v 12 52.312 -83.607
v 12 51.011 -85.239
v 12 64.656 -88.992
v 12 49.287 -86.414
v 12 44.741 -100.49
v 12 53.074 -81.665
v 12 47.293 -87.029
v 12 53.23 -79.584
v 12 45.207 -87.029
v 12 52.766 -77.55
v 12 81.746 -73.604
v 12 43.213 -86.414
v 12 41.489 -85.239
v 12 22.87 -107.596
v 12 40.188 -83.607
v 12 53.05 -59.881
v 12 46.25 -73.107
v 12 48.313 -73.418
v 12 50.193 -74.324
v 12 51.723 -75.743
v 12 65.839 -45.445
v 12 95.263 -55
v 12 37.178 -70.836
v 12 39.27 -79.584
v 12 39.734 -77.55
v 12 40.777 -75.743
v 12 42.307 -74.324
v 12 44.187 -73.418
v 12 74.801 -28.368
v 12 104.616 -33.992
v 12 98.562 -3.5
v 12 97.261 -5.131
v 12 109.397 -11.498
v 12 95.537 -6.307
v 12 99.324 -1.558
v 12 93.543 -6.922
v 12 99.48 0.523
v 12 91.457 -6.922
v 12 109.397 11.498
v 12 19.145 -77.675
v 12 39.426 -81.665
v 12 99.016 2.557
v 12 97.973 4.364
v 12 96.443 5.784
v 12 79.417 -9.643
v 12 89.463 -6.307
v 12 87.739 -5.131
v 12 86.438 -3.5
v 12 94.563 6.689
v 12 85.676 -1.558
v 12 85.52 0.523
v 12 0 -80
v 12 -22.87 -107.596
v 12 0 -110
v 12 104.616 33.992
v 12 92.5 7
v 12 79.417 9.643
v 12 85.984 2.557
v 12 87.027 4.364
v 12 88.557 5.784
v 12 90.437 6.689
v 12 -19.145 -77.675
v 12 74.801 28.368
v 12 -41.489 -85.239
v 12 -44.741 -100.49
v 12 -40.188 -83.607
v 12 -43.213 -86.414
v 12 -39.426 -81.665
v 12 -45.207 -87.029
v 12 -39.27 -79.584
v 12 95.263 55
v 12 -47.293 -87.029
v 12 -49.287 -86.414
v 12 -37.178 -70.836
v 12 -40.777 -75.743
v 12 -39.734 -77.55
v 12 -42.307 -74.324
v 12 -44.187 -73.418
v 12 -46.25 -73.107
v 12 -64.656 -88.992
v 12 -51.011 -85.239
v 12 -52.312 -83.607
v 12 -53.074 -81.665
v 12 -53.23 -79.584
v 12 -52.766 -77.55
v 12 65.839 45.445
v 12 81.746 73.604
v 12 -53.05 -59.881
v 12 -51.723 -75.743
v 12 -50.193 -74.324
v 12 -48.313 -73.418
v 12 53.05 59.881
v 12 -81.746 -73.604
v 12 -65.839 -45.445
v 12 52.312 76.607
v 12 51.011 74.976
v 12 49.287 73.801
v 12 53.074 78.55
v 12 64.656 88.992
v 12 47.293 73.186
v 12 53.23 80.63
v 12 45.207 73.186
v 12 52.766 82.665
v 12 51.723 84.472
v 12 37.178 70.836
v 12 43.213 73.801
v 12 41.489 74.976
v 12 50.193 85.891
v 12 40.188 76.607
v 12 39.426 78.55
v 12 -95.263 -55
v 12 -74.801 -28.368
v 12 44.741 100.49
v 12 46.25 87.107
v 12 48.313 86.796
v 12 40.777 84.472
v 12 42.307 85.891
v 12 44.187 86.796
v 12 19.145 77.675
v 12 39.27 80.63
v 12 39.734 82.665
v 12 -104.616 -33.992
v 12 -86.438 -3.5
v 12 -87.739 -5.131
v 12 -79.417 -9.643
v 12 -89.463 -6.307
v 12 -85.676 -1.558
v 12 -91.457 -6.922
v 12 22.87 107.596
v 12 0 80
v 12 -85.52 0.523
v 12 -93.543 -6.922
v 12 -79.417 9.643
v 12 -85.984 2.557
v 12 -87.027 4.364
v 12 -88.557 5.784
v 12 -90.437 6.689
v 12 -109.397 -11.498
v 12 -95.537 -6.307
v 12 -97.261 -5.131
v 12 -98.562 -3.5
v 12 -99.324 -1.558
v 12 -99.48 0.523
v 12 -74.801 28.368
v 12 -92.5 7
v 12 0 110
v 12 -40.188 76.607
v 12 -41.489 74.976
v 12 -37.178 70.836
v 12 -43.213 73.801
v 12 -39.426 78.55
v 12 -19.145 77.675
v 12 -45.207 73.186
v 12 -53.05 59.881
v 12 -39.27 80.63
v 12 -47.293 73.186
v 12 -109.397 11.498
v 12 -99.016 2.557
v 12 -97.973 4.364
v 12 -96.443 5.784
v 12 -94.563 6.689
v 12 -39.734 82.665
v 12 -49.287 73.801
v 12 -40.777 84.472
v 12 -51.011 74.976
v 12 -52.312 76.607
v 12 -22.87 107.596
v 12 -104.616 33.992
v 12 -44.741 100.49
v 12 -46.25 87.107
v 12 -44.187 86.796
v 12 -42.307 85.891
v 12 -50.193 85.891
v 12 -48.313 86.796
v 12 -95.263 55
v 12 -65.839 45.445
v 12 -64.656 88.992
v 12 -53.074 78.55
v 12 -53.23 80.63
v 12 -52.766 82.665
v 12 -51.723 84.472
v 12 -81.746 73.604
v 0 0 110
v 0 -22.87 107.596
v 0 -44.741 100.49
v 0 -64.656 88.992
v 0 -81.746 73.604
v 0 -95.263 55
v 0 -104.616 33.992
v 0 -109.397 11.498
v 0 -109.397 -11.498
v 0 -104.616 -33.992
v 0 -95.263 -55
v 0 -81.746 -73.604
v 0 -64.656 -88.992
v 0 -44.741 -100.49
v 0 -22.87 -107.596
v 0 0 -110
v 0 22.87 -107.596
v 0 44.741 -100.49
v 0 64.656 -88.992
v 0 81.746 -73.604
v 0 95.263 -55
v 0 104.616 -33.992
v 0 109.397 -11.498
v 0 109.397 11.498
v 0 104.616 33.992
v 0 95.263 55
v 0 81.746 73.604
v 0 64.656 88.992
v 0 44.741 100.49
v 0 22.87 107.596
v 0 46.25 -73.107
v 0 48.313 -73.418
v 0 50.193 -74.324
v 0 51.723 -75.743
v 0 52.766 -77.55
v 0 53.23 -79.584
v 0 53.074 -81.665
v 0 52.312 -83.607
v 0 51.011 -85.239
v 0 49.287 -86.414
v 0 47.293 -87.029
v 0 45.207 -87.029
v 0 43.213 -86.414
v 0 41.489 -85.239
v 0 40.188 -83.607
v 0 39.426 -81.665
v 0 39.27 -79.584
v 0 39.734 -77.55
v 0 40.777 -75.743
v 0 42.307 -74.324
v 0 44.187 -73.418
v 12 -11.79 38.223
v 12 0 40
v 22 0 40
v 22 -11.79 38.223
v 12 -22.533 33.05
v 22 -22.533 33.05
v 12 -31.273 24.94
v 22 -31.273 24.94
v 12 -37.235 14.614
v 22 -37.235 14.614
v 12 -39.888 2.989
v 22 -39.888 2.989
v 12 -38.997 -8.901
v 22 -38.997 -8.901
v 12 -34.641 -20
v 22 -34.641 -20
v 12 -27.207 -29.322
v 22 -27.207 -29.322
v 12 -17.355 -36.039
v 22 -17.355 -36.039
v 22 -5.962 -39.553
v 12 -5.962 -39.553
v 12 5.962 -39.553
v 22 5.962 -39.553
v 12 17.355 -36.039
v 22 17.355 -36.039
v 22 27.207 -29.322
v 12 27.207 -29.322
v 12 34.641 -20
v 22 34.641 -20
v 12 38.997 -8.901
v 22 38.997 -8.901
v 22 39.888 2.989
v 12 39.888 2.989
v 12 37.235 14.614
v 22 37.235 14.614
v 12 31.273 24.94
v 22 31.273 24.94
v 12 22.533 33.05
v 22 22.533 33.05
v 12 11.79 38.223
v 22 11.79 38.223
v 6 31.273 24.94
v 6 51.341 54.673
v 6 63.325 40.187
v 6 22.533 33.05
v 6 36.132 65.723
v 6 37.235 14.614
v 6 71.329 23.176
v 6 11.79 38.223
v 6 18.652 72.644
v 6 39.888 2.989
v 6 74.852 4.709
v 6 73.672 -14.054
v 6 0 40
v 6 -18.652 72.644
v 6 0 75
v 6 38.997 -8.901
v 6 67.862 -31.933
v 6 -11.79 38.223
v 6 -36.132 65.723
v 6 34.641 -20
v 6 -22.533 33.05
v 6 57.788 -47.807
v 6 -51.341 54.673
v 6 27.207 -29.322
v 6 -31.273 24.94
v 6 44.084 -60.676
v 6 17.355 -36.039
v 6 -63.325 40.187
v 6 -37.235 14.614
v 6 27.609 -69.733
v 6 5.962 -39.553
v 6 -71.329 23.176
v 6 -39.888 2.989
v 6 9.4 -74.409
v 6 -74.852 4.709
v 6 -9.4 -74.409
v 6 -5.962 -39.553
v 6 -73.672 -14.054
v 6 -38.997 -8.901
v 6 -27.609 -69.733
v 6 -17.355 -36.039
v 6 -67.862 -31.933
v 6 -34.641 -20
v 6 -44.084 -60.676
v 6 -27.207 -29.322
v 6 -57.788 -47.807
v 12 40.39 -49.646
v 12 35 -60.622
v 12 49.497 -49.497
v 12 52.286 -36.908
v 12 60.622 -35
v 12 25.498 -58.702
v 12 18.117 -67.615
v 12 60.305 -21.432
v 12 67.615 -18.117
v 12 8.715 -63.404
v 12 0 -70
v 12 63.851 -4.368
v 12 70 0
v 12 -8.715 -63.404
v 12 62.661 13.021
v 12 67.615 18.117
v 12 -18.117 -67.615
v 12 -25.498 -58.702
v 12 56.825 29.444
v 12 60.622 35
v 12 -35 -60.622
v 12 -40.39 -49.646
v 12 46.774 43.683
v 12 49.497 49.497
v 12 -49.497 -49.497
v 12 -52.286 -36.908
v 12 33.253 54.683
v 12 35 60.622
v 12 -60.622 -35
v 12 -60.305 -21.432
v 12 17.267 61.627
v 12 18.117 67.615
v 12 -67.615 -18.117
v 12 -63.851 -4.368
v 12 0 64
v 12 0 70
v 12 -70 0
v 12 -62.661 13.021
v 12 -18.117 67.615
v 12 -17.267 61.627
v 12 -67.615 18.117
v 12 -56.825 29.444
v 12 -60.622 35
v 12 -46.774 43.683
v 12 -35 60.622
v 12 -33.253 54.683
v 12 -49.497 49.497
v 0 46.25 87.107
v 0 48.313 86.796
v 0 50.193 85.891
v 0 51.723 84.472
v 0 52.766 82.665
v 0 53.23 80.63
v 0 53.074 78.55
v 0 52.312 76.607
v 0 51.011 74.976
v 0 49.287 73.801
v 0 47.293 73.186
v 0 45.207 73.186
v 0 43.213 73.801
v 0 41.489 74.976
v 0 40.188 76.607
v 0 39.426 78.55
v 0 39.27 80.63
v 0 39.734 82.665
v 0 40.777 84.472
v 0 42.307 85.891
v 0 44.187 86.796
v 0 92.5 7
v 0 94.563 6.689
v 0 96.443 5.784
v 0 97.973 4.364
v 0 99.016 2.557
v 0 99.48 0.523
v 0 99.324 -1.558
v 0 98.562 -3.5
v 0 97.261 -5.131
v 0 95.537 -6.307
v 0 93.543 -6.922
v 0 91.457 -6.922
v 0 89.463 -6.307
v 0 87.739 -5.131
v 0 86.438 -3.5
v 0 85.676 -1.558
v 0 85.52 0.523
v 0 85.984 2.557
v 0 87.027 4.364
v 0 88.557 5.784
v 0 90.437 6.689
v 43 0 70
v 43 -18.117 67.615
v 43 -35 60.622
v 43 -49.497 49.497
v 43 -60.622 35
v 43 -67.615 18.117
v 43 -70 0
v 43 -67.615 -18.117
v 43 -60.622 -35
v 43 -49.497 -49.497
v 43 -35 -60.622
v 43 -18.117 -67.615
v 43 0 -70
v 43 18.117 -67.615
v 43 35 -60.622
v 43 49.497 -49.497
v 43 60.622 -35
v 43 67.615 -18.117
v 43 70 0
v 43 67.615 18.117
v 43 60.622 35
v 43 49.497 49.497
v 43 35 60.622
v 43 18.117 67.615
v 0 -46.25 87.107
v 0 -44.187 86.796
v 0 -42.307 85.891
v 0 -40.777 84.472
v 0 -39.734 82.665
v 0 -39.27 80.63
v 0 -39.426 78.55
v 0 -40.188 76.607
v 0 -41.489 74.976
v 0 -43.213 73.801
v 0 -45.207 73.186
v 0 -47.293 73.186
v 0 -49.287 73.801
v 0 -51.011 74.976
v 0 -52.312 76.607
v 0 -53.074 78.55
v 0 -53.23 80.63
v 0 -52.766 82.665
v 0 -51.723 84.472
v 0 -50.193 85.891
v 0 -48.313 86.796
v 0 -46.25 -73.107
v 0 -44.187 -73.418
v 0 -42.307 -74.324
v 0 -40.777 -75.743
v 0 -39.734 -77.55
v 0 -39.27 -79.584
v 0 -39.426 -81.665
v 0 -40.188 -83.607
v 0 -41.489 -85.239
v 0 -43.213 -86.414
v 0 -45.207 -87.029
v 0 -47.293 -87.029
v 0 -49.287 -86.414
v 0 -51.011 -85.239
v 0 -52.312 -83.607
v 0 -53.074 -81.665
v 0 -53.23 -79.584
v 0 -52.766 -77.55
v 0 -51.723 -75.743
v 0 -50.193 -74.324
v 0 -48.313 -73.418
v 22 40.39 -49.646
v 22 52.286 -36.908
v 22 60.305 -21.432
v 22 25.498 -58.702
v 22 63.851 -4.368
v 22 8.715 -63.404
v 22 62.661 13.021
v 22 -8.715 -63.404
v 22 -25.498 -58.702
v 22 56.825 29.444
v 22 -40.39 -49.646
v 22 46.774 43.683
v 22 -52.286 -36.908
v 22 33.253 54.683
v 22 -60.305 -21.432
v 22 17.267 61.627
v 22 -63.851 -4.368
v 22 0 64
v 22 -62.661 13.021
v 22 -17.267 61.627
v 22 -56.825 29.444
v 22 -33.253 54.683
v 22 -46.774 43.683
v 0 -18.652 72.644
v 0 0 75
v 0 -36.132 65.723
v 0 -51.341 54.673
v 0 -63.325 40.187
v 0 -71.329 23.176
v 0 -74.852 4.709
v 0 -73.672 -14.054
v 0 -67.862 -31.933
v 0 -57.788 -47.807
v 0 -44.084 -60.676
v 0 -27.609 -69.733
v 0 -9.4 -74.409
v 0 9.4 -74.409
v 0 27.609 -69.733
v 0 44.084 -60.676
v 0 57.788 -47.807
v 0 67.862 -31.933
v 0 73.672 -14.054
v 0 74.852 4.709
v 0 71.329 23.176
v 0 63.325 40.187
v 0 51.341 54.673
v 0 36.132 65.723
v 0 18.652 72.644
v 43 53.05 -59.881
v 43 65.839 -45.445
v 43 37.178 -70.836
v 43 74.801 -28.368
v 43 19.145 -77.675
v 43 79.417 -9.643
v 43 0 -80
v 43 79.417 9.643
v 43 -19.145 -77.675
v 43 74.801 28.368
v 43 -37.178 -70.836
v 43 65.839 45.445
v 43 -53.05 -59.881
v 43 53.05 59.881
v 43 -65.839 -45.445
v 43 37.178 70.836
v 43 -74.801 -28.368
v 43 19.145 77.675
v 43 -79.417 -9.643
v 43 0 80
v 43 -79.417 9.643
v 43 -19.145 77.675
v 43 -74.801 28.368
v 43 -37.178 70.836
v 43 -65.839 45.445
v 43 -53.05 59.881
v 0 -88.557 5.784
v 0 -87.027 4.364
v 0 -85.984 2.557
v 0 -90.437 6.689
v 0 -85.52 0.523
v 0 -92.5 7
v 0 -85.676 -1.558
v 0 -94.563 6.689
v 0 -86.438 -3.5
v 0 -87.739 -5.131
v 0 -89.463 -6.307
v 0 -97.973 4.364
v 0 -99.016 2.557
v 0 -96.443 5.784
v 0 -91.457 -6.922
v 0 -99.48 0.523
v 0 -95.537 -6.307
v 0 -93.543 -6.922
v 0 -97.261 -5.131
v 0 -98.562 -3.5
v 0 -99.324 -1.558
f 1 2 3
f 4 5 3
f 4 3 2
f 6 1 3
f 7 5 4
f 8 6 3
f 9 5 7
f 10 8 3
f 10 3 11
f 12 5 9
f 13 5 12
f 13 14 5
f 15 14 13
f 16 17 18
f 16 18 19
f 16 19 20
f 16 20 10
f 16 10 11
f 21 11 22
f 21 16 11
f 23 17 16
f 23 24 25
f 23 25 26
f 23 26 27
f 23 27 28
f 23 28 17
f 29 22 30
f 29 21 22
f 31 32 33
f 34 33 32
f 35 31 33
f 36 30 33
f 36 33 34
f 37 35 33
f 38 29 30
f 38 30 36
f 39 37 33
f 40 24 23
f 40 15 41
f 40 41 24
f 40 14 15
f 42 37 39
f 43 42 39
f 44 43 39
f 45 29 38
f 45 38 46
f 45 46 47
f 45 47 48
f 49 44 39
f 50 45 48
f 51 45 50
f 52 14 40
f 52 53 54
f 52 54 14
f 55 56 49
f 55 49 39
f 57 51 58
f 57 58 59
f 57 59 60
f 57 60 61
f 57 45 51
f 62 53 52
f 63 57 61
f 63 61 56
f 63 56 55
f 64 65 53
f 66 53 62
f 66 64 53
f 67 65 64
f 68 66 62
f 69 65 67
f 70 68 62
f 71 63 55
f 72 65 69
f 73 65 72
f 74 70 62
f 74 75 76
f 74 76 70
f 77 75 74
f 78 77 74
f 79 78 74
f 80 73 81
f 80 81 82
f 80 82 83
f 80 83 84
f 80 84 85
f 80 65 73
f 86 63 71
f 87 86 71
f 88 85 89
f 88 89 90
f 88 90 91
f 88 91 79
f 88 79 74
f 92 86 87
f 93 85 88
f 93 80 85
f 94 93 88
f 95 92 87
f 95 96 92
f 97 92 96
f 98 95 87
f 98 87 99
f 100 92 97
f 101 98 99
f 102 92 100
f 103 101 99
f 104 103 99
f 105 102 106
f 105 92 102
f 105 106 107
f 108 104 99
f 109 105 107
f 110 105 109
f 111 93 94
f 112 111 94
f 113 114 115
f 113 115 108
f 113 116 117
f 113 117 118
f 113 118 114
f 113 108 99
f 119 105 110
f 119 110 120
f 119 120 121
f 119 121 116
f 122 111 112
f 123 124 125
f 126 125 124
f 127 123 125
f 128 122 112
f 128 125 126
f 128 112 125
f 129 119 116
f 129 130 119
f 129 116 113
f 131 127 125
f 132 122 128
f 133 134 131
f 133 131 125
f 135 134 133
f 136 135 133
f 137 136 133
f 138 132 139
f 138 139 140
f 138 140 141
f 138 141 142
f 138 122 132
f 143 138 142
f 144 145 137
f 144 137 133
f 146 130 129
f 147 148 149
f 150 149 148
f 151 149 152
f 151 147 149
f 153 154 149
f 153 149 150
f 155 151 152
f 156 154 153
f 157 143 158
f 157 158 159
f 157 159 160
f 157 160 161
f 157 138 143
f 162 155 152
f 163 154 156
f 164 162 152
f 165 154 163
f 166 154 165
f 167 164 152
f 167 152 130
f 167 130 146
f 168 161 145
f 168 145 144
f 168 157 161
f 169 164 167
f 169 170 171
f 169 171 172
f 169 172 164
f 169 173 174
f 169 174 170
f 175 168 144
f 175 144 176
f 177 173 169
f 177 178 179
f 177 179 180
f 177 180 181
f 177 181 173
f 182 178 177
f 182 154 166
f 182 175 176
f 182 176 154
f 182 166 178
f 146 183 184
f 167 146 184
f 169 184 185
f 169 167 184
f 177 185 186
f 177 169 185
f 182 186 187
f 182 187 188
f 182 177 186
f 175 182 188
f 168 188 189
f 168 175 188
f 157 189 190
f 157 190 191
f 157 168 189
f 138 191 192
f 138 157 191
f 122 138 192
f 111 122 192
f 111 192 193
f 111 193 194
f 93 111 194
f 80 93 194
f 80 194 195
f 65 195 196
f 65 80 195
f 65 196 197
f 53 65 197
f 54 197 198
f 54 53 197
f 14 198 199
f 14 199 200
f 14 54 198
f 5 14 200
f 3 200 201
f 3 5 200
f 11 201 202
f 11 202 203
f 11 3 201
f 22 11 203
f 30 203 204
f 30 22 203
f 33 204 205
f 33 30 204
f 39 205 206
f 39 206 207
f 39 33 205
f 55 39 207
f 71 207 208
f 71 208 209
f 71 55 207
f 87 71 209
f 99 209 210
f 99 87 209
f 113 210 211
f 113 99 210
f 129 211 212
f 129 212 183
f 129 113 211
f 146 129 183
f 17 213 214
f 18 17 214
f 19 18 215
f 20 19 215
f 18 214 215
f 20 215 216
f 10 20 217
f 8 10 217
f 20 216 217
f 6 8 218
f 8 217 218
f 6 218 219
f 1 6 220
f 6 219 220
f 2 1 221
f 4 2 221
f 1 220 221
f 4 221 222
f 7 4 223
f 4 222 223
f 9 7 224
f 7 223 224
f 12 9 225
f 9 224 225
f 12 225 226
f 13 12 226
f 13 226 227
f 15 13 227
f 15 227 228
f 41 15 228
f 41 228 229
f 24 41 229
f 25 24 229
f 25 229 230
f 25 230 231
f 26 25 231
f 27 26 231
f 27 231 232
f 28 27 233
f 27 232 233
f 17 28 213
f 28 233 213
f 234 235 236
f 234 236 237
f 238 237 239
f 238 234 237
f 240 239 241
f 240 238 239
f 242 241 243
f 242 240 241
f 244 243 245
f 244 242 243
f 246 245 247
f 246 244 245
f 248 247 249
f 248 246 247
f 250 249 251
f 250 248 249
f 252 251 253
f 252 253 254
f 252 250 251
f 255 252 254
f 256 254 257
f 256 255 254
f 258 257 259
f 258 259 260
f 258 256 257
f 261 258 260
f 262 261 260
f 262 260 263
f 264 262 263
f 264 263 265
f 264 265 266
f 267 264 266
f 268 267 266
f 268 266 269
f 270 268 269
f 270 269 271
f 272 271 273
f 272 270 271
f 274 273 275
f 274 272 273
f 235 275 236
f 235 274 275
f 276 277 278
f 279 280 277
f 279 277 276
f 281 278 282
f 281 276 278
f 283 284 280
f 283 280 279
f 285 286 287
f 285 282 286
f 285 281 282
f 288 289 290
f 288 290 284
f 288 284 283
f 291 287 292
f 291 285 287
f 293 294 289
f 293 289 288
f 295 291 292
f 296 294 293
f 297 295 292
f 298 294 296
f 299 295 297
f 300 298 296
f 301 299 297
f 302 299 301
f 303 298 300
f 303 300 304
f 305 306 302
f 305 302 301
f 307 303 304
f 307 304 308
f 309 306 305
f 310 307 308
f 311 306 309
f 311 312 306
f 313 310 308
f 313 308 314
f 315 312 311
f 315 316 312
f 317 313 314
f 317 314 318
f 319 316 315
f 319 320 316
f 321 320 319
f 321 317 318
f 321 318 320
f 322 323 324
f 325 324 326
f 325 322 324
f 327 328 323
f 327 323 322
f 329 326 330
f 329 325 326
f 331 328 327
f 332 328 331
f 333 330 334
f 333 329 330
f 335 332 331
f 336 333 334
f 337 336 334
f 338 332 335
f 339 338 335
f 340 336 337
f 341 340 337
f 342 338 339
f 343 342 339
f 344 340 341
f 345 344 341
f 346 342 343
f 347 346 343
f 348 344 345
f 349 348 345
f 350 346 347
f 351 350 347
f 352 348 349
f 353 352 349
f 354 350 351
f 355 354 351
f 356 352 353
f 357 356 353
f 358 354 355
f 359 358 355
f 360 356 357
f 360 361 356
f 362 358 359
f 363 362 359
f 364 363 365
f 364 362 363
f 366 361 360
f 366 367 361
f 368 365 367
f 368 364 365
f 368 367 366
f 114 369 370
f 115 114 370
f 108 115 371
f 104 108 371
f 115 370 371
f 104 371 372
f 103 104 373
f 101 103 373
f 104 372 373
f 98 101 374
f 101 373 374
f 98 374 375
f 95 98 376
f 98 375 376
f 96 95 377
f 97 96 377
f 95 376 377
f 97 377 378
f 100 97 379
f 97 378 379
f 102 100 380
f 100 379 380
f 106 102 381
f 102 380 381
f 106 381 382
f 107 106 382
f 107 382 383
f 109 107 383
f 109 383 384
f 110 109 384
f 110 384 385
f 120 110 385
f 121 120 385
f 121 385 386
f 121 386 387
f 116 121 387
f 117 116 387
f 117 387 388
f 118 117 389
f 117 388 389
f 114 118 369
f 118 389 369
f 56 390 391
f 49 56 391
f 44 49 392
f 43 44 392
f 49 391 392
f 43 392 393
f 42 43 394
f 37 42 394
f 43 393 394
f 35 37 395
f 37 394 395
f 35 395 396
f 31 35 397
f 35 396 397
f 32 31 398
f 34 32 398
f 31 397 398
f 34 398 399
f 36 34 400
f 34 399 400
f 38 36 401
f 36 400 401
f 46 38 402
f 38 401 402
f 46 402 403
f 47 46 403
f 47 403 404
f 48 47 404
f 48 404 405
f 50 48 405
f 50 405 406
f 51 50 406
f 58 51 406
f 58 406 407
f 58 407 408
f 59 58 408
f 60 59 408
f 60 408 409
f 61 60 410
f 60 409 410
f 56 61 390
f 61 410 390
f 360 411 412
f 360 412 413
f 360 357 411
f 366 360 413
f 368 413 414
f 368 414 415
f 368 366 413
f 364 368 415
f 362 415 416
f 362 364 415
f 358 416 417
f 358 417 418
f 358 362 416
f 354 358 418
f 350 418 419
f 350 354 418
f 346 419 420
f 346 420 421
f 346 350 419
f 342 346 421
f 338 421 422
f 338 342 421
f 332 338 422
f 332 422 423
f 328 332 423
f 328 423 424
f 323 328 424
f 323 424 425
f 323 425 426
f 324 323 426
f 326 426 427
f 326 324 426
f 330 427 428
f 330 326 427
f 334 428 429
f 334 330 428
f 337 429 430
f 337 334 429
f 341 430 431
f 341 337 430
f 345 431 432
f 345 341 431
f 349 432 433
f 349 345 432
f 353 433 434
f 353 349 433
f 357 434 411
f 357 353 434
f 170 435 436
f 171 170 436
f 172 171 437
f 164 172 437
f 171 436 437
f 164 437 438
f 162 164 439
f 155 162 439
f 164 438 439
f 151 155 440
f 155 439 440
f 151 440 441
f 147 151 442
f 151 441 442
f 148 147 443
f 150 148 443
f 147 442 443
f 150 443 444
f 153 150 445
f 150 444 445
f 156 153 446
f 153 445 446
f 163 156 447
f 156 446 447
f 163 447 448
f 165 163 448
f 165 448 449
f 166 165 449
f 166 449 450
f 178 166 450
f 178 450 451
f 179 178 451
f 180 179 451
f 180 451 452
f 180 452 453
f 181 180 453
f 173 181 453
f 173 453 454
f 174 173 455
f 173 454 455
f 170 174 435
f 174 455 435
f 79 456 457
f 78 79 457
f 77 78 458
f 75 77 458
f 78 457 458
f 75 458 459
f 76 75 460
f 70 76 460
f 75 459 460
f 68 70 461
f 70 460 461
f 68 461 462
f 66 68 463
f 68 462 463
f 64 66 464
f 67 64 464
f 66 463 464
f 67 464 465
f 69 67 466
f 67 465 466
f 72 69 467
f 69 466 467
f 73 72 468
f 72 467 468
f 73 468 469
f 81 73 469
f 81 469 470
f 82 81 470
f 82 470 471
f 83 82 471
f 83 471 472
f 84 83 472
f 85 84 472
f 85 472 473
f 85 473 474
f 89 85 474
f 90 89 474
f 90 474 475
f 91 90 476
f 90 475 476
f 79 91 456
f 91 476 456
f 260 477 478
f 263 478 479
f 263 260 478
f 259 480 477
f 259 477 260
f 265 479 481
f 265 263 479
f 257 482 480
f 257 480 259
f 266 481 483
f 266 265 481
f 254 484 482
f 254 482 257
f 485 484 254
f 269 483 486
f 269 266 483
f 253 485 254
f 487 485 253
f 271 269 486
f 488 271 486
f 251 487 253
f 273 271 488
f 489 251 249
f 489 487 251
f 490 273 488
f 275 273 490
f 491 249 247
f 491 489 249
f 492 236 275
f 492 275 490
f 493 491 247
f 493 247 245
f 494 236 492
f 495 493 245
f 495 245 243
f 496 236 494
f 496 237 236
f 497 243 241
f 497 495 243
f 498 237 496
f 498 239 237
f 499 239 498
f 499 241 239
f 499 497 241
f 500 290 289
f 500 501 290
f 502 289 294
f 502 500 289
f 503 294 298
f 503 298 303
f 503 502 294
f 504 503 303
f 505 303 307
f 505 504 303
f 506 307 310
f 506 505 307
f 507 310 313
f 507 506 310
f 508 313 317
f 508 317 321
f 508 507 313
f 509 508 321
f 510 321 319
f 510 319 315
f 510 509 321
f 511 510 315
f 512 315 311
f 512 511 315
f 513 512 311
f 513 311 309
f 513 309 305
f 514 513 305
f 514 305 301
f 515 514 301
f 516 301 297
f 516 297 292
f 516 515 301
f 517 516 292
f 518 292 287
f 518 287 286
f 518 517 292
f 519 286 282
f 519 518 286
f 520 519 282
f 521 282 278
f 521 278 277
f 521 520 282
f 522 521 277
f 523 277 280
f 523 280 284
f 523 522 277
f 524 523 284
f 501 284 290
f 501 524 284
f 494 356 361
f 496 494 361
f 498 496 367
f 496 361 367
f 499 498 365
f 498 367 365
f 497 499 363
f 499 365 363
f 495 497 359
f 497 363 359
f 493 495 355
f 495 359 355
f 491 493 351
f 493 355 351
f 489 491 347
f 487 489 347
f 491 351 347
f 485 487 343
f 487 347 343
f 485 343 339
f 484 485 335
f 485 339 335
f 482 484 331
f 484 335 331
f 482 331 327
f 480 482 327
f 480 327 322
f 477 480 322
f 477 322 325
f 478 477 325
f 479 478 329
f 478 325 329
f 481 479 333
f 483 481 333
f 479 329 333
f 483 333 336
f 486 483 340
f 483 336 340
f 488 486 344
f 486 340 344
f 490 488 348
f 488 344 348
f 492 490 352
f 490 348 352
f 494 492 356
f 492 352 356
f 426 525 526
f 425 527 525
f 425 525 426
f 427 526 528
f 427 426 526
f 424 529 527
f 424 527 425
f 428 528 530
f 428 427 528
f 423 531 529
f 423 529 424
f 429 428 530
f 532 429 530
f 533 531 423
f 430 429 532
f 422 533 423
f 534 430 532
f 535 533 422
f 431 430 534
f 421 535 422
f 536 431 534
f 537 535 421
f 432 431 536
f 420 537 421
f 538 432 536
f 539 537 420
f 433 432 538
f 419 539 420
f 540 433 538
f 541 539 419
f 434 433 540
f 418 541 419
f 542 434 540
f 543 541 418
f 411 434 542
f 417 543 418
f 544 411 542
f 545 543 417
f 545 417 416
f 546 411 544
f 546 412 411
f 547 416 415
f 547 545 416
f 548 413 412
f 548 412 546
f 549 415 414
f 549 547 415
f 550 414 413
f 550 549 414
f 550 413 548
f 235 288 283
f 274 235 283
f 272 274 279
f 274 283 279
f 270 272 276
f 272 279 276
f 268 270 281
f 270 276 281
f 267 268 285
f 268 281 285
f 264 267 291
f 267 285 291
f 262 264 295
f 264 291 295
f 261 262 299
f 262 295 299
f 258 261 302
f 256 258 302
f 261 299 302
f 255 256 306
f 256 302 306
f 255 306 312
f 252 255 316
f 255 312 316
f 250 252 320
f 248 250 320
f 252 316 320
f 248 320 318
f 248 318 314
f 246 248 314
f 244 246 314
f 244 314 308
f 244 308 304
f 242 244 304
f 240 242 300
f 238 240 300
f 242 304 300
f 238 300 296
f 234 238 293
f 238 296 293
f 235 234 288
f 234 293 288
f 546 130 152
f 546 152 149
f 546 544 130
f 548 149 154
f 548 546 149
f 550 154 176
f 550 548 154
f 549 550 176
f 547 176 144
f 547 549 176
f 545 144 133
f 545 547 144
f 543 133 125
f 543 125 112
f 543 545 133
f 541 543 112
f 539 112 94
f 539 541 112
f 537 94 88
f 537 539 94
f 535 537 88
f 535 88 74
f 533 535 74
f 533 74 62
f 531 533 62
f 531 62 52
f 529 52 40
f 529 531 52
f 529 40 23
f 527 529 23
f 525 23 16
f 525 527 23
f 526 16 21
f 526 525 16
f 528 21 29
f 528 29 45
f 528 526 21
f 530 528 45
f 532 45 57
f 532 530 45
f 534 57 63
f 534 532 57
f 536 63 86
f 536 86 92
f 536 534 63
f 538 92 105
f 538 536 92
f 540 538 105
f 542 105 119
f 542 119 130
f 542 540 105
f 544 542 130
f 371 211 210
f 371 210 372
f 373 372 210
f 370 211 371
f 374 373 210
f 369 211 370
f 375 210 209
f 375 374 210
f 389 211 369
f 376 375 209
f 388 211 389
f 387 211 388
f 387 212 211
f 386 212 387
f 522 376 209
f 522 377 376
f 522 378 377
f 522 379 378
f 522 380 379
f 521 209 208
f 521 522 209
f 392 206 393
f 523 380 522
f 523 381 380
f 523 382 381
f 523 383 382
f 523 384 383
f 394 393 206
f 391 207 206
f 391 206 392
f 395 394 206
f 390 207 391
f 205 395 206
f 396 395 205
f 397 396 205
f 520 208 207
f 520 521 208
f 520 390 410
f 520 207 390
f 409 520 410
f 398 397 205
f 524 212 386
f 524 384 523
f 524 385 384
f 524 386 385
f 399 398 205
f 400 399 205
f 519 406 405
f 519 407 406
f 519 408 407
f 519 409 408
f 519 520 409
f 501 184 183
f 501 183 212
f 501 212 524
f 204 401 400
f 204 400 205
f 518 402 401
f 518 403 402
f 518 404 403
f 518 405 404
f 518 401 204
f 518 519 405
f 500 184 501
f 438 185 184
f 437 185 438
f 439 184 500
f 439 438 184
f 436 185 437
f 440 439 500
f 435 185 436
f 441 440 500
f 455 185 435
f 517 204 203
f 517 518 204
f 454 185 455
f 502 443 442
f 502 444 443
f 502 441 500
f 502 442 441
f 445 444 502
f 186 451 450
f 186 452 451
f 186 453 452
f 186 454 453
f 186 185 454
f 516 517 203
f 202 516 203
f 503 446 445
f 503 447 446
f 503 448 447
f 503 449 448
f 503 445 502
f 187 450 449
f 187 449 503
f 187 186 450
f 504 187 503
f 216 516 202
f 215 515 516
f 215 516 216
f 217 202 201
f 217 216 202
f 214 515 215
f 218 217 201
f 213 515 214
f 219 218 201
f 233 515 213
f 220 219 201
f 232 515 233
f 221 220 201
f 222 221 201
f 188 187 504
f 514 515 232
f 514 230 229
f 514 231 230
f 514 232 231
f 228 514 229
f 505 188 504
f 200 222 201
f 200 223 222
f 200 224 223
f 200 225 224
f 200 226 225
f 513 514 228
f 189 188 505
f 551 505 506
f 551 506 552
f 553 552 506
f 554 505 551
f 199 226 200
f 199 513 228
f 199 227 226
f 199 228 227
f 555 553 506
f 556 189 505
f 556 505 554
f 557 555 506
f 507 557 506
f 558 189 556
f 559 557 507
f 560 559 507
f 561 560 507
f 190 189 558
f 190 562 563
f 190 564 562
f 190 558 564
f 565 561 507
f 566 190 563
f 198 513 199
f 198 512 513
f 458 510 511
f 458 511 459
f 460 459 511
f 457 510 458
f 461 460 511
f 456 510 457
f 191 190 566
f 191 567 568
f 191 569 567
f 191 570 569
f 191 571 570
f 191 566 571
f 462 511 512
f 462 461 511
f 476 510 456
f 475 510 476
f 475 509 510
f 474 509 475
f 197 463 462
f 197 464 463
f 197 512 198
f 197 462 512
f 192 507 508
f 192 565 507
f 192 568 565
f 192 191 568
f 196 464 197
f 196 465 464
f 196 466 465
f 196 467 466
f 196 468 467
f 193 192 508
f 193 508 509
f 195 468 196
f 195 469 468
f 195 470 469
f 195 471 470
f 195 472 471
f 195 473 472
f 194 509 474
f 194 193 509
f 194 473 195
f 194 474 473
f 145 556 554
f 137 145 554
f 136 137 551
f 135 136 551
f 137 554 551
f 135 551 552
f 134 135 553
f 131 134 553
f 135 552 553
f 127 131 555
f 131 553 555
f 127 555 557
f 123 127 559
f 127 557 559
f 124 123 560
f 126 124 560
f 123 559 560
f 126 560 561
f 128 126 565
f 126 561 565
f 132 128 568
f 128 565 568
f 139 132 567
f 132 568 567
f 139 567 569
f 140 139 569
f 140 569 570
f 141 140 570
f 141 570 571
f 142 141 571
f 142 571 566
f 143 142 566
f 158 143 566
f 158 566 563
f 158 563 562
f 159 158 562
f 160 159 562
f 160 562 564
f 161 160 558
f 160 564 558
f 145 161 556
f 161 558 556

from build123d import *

# Parameters (mm, degrees)
SKETCH2_R           = 7
CUT_EXTRUDE1_DEPTH  = 12
SKETCH3_R           = 40
CUT_EXTRUDE2_DEPTH  = 6
SKETCH4_R           = 64
SKETCH4_R_2         = 40
BOSS_EXTRUDE1_DEPTH = 10


with BuildPart() as part:
    # Sketch1 → Revolve1 (revolve)
    with BuildSketch(Plane.XY, mode=Mode.PRIVATE) as revolve1_sk:
        Polygon((0, 75), (0, 110), (12, 110), (12, 80), (43, 80), (43, 70), (12, 70), (12, 0), (6, 0), (6, 75), align=None)
    revolve(revolve1_sk.sketch.rotate(Axis((0, 0, 0), (1, 0, 0)), 90), axis=Axis((0, 0, 0), (1, 0, 0)))

    # Sketch2 → Cut-Extrude1 (cut)
    with BuildSketch(Plane.ZY):
        with Locations((0, 92.5)):
            Circle(SKETCH2_R)
        with Locations((80.10734985, 46.25)):
            Circle(SKETCH2_R)
        with Locations((80.10734985, -46.25)):
            Circle(SKETCH2_R)
        with Locations((0, -92.5)):
            Circle(SKETCH2_R)
        with Locations((-80.10734985, -46.25)):
            Circle(SKETCH2_R)
        with Locations((-80.10734985, 46.25)):
            Circle(SKETCH2_R)
    extrude(amount=-CUT_EXTRUDE1_DEPTH, mode=Mode.SUBTRACT)

    # Sketch3 → Cut-Extrude2 (cut)
    with BuildSketch(Plane.ZY.offset(-6)):
        Circle(SKETCH3_R)
    extrude(amount=-CUT_EXTRUDE2_DEPTH, mode=Mode.SUBTRACT)

    # Sketch4 → Boss-Extrude1 (add)
    with BuildSketch(Plane(origin=(12, 0, 0), x_dir=(0, 0, -1), z_dir=(1, 0, 0))):
        with Locations(Location((0, 0, 0), (0, 0, 180))):
            Circle(SKETCH4_R)
        with Locations(Location((0, 0, 0), (0, 0, 180))):
            Circle(SKETCH4_R_2, mode=Mode.SUBTRACT)
    extrude(amount=BOSS_EXTRUDE1_DEPTH)


solid = part.part
